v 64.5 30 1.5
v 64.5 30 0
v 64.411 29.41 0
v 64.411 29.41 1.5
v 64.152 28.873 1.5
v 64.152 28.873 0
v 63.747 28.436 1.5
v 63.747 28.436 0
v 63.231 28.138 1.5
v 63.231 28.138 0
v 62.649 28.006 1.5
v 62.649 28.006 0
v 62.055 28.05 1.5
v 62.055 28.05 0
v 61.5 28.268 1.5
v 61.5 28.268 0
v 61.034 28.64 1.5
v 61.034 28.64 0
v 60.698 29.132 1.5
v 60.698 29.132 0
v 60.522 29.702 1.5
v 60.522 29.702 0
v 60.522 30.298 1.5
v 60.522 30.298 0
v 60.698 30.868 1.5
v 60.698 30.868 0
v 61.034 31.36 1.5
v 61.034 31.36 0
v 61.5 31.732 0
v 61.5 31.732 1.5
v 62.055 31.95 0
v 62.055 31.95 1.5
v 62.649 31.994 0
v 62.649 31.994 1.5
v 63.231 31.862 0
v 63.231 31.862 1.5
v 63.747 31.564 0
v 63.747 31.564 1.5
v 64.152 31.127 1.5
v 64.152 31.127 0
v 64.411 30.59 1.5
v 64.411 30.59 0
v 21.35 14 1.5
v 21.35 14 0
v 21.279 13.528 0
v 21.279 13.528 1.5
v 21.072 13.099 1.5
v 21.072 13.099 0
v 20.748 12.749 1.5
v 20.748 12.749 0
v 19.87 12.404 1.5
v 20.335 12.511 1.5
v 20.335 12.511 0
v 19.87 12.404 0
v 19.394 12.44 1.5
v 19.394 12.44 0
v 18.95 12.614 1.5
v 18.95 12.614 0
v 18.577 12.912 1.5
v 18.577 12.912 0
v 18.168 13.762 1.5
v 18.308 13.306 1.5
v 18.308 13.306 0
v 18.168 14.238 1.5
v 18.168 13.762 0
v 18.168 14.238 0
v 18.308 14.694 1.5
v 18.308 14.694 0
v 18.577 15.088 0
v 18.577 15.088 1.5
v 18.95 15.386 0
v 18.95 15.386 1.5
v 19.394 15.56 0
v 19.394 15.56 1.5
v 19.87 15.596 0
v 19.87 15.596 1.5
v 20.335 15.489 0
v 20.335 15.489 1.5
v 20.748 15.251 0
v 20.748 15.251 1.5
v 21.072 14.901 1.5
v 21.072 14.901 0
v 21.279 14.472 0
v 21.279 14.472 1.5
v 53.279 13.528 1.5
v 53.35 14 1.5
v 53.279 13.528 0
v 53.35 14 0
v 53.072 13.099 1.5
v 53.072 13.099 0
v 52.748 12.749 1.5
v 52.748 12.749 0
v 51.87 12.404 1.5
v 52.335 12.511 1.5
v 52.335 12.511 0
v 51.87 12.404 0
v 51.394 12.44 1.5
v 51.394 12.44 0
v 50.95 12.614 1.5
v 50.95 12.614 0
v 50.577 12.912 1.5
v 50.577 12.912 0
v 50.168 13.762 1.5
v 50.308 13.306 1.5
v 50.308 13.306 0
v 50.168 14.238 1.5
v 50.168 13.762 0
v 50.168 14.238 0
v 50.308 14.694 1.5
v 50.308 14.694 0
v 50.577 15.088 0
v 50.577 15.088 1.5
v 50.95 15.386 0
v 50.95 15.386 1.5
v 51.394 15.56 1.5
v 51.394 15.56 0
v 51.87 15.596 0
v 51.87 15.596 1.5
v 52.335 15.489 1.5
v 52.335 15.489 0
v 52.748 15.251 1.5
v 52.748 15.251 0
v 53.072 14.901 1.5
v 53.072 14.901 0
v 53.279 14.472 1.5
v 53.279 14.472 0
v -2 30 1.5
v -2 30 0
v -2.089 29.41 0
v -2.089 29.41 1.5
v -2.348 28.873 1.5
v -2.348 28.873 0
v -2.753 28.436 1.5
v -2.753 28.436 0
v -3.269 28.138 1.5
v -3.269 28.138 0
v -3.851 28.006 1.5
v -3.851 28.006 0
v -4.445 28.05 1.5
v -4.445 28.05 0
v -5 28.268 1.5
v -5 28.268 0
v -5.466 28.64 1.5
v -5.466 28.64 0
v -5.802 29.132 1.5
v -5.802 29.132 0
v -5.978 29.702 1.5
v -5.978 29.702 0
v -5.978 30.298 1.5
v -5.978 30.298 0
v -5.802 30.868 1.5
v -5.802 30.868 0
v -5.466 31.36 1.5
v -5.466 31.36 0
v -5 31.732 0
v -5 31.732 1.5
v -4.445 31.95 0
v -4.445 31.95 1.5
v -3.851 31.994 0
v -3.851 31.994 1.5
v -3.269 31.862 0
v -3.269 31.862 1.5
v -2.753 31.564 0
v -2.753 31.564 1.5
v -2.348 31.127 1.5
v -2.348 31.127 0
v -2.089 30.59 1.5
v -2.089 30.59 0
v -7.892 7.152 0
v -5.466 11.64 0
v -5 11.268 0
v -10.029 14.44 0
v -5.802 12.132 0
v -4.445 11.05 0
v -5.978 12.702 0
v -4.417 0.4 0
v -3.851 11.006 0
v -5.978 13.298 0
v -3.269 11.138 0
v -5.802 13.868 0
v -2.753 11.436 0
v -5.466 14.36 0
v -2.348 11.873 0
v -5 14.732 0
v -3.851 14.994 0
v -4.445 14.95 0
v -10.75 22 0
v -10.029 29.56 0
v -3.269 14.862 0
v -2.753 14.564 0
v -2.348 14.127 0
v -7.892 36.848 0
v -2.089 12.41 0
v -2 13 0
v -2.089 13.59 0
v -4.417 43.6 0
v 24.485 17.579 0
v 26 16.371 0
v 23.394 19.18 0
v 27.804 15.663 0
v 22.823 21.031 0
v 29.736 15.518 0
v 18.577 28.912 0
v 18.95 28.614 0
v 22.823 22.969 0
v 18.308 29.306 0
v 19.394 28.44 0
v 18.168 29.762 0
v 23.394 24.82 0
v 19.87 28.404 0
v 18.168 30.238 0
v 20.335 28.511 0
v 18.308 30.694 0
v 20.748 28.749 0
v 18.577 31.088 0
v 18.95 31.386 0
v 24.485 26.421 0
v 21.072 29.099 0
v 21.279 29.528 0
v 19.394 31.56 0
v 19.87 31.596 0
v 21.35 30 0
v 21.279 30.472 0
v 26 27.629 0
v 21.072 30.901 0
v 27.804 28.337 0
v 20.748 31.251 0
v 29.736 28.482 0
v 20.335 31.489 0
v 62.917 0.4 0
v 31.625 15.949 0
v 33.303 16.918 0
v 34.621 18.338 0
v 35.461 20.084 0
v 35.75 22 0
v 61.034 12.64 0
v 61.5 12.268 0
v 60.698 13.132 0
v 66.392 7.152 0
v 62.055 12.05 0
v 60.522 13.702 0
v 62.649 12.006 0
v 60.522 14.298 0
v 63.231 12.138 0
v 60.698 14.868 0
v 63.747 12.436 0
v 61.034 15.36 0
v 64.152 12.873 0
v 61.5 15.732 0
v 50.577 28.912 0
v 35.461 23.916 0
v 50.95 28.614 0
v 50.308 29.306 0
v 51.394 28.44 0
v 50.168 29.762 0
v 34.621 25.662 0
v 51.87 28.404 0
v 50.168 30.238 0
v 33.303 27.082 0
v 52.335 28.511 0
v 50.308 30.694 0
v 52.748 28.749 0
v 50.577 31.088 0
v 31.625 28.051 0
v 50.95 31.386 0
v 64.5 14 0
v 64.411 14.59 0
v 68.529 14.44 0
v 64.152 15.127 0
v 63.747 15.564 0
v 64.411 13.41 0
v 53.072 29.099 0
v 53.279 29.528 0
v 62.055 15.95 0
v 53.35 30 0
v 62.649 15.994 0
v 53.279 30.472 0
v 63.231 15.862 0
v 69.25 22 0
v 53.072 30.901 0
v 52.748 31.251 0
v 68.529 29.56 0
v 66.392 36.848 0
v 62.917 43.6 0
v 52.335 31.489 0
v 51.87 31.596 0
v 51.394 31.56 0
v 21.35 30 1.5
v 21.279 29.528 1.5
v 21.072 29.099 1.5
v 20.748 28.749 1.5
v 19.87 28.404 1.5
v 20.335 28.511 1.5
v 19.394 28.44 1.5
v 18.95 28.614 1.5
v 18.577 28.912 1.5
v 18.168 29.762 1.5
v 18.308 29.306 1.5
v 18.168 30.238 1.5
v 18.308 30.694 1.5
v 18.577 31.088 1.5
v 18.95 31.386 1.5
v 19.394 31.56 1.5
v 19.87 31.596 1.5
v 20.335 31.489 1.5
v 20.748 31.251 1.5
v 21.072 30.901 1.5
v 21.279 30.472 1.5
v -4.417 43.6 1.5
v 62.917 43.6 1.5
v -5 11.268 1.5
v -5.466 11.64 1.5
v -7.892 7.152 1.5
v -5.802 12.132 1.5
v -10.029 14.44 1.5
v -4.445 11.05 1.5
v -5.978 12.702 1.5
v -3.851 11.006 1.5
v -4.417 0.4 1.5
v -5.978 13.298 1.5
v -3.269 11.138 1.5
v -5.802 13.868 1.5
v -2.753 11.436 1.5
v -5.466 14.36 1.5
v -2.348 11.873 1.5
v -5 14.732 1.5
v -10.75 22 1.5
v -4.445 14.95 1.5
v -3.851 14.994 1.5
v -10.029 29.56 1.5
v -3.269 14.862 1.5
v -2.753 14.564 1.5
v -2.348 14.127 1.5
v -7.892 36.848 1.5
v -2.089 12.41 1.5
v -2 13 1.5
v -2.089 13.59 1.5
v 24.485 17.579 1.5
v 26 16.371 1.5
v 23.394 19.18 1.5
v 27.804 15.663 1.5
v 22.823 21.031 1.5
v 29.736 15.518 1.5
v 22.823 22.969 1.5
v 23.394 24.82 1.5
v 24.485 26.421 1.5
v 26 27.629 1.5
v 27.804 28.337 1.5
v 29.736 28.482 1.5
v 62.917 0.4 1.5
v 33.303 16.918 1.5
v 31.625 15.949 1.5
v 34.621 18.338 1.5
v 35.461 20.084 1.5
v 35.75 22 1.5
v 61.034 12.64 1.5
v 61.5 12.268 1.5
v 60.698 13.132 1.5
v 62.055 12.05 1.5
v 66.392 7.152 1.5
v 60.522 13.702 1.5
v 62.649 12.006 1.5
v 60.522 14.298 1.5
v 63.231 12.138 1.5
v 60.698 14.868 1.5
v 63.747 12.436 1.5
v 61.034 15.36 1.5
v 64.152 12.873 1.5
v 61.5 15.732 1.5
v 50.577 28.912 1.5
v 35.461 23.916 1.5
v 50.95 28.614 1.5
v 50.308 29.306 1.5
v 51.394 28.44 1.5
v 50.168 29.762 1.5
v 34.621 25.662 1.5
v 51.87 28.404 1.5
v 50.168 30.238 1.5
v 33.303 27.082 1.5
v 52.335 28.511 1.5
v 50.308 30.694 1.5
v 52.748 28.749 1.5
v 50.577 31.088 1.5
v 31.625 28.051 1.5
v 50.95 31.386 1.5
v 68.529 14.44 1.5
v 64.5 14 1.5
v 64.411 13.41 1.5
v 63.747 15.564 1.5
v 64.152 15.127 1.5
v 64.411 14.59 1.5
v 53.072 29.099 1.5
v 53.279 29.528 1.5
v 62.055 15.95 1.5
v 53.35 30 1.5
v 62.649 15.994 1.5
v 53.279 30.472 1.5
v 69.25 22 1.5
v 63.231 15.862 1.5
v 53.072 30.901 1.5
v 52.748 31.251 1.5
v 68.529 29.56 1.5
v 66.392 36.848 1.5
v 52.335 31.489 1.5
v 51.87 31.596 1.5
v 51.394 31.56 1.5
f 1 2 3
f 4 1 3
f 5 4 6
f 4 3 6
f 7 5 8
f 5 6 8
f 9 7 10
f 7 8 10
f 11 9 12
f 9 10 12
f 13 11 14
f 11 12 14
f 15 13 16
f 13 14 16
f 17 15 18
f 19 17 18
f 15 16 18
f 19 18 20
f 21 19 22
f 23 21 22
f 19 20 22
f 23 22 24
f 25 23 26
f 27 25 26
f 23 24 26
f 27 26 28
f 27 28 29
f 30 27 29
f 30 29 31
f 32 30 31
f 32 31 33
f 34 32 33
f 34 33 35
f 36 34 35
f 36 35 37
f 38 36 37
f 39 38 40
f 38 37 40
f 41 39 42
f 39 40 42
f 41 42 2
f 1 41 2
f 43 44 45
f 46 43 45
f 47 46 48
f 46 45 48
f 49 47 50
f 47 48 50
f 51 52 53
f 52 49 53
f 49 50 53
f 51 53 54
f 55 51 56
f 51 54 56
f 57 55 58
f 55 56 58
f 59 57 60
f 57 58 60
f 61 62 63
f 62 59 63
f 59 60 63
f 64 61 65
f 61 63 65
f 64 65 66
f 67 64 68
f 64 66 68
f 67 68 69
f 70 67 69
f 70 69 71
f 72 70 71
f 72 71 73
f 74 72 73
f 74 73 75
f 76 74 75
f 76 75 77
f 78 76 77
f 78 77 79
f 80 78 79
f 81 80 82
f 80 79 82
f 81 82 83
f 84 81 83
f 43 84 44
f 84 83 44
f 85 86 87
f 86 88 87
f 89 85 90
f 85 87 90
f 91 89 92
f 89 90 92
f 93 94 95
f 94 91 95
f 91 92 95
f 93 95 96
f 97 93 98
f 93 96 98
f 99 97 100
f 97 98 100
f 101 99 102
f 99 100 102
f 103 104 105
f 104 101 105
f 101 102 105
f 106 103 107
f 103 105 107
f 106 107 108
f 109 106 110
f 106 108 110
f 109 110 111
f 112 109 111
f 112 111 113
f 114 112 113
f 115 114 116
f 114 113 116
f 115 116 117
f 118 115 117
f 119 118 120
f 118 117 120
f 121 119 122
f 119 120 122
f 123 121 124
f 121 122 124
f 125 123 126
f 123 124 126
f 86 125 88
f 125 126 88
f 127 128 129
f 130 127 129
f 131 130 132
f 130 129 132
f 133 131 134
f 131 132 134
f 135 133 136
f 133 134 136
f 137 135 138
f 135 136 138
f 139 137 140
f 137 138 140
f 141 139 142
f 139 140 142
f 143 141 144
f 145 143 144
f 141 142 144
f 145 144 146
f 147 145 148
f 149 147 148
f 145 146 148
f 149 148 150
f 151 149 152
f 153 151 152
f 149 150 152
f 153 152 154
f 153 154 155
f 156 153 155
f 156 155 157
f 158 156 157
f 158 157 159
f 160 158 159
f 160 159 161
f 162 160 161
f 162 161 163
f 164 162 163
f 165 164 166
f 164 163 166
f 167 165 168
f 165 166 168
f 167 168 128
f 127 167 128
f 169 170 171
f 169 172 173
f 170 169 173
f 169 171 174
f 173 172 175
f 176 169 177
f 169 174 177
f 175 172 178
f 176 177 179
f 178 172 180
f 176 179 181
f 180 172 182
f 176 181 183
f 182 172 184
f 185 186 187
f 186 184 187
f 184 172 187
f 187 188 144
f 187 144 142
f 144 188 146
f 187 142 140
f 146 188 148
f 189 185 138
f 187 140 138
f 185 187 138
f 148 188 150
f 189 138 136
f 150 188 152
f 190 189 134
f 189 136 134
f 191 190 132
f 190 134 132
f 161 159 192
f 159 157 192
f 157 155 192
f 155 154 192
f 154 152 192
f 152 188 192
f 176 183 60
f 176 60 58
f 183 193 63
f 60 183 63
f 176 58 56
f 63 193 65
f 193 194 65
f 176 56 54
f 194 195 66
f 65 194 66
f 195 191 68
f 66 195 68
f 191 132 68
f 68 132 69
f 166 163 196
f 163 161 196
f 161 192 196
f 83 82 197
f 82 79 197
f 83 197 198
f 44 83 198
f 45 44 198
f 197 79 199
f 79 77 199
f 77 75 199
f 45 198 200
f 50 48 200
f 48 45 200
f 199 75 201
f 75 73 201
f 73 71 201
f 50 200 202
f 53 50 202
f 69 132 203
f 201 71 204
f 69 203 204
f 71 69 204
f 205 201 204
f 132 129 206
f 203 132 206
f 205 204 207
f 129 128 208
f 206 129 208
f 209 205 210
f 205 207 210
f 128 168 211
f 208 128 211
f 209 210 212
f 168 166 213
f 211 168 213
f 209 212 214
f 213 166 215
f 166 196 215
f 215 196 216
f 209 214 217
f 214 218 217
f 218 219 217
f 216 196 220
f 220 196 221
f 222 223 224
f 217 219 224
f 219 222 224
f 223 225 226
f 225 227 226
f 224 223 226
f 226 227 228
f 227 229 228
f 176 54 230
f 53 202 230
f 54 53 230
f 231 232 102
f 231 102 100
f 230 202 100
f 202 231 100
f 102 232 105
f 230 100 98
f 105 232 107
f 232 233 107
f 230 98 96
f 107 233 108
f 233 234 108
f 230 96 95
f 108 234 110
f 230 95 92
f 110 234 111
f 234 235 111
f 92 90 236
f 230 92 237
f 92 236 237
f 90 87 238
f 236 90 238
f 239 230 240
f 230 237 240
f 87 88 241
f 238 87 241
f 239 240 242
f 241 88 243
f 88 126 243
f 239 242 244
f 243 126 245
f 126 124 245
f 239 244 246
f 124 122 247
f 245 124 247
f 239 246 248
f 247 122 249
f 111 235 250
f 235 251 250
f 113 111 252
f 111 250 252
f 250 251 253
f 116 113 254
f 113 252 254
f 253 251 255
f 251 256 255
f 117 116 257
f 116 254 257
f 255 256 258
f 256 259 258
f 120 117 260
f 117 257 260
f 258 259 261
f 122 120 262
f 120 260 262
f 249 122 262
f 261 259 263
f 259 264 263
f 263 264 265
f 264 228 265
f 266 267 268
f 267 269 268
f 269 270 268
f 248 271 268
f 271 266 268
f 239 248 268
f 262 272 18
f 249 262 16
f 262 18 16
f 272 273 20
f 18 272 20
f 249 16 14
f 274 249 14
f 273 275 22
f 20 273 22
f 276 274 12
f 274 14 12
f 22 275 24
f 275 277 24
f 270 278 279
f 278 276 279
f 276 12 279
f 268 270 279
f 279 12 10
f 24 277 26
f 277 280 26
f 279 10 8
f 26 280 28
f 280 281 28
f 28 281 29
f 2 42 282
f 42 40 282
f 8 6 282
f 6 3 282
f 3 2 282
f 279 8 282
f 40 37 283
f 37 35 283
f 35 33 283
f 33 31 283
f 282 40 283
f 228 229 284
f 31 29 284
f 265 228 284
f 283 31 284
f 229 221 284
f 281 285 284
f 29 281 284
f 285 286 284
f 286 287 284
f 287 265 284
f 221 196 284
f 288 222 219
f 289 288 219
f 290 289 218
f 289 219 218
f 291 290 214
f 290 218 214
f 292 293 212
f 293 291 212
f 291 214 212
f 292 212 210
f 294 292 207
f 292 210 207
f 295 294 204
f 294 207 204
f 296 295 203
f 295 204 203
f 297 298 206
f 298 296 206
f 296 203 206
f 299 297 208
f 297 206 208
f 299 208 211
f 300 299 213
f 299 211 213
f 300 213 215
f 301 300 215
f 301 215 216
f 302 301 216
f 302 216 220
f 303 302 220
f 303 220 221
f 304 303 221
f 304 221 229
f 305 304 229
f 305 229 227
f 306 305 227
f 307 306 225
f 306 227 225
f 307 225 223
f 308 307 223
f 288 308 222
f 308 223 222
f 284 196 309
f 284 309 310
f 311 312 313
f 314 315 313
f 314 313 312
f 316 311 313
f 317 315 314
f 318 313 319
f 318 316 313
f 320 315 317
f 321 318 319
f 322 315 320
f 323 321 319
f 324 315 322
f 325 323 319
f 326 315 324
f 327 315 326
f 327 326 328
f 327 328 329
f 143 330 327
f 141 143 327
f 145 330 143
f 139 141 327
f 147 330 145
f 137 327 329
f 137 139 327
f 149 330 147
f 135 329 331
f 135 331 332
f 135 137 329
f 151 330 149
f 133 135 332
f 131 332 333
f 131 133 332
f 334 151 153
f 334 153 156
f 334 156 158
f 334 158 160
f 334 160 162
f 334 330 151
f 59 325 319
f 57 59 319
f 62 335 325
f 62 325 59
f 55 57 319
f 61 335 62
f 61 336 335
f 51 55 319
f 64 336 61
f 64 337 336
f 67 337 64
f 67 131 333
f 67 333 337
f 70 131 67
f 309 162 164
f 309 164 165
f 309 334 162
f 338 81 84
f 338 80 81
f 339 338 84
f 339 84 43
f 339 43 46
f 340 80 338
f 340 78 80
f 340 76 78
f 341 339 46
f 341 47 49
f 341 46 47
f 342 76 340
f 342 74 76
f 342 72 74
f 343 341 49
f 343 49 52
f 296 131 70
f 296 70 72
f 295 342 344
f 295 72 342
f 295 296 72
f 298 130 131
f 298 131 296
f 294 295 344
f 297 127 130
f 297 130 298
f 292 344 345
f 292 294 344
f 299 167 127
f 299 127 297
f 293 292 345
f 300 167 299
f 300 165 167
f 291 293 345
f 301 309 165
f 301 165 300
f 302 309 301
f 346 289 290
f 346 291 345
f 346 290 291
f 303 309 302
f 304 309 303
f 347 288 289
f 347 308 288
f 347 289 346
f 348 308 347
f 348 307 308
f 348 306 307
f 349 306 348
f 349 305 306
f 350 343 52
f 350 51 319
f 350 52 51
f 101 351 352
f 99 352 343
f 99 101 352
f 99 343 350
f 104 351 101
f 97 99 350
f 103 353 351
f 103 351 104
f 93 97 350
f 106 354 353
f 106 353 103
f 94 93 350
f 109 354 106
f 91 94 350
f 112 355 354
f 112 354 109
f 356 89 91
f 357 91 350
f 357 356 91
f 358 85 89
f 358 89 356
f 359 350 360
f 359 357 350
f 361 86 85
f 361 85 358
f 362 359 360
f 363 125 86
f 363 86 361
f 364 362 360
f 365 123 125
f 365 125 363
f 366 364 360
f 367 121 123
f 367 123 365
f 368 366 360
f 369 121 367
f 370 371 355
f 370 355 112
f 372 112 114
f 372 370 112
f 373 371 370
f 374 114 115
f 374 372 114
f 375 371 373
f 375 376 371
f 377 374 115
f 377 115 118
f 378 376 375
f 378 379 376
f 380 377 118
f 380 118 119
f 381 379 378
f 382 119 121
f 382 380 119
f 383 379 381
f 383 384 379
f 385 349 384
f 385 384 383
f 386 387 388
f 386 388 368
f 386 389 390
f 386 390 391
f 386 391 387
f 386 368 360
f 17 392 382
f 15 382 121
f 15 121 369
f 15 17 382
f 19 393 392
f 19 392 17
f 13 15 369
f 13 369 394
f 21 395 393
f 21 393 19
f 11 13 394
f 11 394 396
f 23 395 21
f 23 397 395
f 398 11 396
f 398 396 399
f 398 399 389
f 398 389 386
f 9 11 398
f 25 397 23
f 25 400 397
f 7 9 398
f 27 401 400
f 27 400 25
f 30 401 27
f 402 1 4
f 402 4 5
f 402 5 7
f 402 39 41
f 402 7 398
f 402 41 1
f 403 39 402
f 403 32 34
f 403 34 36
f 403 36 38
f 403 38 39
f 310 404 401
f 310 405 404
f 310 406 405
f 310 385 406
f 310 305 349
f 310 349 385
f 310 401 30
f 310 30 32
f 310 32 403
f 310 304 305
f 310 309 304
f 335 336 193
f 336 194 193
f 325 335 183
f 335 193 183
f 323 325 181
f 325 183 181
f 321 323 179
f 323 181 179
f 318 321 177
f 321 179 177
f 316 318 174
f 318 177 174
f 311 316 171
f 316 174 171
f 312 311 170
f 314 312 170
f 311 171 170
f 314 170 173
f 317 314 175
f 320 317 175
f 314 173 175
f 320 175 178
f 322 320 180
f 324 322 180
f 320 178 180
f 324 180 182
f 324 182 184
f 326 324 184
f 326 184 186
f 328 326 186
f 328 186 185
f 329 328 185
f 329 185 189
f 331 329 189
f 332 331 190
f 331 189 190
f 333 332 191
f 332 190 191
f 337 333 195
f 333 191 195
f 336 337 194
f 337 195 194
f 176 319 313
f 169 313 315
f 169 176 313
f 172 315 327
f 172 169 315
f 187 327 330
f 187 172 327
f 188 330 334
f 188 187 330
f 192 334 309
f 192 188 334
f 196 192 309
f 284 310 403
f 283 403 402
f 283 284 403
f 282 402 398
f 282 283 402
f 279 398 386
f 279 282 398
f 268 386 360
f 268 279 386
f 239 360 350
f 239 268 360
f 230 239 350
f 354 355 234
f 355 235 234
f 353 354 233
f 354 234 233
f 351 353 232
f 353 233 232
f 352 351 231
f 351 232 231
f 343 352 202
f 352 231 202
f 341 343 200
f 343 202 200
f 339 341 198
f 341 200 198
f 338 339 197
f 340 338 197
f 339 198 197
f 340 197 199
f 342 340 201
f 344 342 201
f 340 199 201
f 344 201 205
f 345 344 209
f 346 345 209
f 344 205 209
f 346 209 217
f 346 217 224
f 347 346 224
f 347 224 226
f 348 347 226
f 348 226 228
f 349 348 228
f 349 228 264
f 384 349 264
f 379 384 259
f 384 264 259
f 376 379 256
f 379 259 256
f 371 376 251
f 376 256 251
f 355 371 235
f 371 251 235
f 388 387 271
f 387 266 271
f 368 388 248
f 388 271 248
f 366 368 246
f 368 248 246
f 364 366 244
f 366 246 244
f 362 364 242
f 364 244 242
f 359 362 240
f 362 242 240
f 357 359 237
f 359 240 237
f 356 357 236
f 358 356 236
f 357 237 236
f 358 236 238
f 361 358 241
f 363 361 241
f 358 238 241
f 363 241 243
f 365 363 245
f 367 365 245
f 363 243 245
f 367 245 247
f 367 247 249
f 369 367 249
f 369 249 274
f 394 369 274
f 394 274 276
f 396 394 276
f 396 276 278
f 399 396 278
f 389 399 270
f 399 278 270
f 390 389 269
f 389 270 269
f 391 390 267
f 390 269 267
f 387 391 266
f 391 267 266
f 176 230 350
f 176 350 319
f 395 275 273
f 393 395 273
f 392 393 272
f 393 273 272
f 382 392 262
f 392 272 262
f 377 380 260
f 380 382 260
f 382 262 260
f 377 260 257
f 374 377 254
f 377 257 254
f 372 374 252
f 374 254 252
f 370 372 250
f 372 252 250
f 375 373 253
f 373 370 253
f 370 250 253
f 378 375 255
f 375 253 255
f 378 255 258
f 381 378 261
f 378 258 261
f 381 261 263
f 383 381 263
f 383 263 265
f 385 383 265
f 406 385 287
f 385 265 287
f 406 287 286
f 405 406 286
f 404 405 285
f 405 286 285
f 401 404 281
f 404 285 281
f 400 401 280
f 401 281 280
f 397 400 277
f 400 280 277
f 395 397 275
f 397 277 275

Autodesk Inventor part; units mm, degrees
ref_plane "YZ Plane" through (0, 0, 0) normal (1, 0, 0) x (0, 1, 0)
ref_plane "XZ Plane" through (0, 0, 0) normal (0, 1, 0) x (-1, 0, 0)
ref_plane "XY Plane" through (0, 0, 0) normal (0, 0, 1) x (1, 0, 0)
sketch "スケッチ1" plane through (0, 0, 0) normal (0, 0, 1) x (1, 0, 0)
  line L0 (24.05, 13.6) -> (24.05, 0.4) projected
  line L1 (24.05, 13.6) -> (37.25, 13.6) projected
  line L2 (37.25, 13.6) -> (37.25, 0.4) projected
  line L3 (56.5, 0.4) -> (37.25, 0.4) projected
  line L4 (56.5, 43.6) -> (56.5, 0.4) projected
  line L5 (2, 43.6) -> (56.5, 43.6) projected
  line L6 (2, 43.6) -> (2, 0.4) projected
  line L7 (24.05, 0.4) -> (2, 0.4) projected
  circle A0 centre (19.75, 30) radius 1.35 projected
  circle A1 centre (51.75, 14) radius 1.35 projected
  circle A2 centre (51.75, 30) radius 1.35 projected
  circle A3 centre (19.75, 14) radius 1.35 projected
  line L8 (2, 43.6) -> (56.5, 43.6)
  line L9 (56.5, 43.6) -> (56.5, 0.4)
  line L10 (56.5, 0.4) -> (2, 0.4)
  line L11 (2, 0.4) -> (2, 43.6)
  circle A4 centre (19.75, 14) radius 1.6
  circle A5 centre (19.75, 30) radius 1.6
  circle A6 centre (51.75, 30) radius 1.6
  circle A7 centre (51.75, 14) radius 1.6
  line L12 (-3.8486, -27.4677) -> (-13.8486, -27.4561) projected
  line L13 (34.25, -27.4677) -> (34.25, 112.5)
  line L14 (24.25, -27.4561) -> (24.25, 112.5)
  line L15 (24.25, 22) -> (34.25, 22)
  circle A8 centre (29.25, 22) radius 6.5
  circle A9 centre (29.25, 22) radius 40
  line L16 (2, 22) -> (-10.75, 22)
  line L17 (56.5, 22) -> (69.25, 22)
  line L18 (2, 22) -> (-4, 22)
  line L19 (-4, 22) -> (-4, 13)
  line L20 (-4, 13) -> (2, 13)
  line L21 (2, 13) -> (2, 22)
  line L22 (2, 22) -> (-4, 22)
  line L23 (-4, 22) -> (-4, 30)
  line L24 (-4, 30) -> (2, 30)
  line L25 (2, 30) -> (2, 22)
  line L26 (56.5, 22) -> (62.5, 22)
  line L27 (62.5, 22) -> (62.5, 14)
  line L28 (62.5, 14) -> (56.5, 14)
  line L29 (56.5, 14) -> (56.5, 22)
  line L30 (56.5, 22) -> (62.5, 22)
  line L31 (62.5, 22) -> (62.5, 30)
  line L32 (62.5, 30) -> (56.5, 30)
  line L33 (56.5, 30) -> (56.5, 22)
  circle A10 centre (-4, 13) radius 2
  circle A11 centre (-4, 30) radius 2
  circle A12 centre (62.5, 30) radius 2
  circle A13 centre (62.5, 14) radius 2
  line L34 (2, 43.6) -> (-4.4166, 43.6)
  line L35 (56.5, 43.6) -> (62.9166, 43.6)
  line L36 (2, 0.4) -> (-4.4166, 0.4)
  line L37 (56.5, 0.4) -> (62.9166, 0.4)
  point P0 (0, 0)
  point P1 (34.25, 112.5)
  point P2 (24.25, 112.5)
  point P3 (63.0326, 0.5819)
  point P4 (61.25, 46)
  point P5 (24.3716, 20.9038)
  point P6 (24.3687, 23.0832)
  point P7 (25.6996, 25.5206)
  point P8 (25.082, 19.2381)
  dimension "d7" = 80
  dimension "d0" = 3.2
  dimension "d1" = 3.2
  dimension "d2" = 3.2
  dimension "d3" = 3.2
  dimension "d6" = 13
  dimension "d8" = 6
  dimension "d9" = 9
  dimension "d10" = 6
  dimension "d11" = 4
  dimension "d12" = 4
  dimension "d13" = 4
  dimension "d14" = 4
extrude "押し出し1" add sketch "スケッチ1" along normal blind 1.5 contours L1 L14 L10 L0 | L0 L7 L6 L5 L14 A8 L1 | L14 A8 L13 L1 | L1 L13 L10 L14 | L36 A9 L16 L19 A10 L20 L6 | L13 A8 L5 L4 L3 L2 L1 | L1 L2 L10 L13 | L20 A10 L19 L16 L6 | L14 L5 L13 A8 | L16 L23 A11 L24 L6 | A9 L34 L6 L24 A11 L23 L16 | L4 L28 A13 L27 L17 A9 L37 | L4 L17 L27 A13 L28 | L17 L31 A12 L32 L4 L35 A9 | L4 L32 A12 L31 L17
sketch "スケッチ2" plane through (0, 0, 1.5) normal (0, 0, 1) x (1, 0, 0)
  point P0 (0, 0)
